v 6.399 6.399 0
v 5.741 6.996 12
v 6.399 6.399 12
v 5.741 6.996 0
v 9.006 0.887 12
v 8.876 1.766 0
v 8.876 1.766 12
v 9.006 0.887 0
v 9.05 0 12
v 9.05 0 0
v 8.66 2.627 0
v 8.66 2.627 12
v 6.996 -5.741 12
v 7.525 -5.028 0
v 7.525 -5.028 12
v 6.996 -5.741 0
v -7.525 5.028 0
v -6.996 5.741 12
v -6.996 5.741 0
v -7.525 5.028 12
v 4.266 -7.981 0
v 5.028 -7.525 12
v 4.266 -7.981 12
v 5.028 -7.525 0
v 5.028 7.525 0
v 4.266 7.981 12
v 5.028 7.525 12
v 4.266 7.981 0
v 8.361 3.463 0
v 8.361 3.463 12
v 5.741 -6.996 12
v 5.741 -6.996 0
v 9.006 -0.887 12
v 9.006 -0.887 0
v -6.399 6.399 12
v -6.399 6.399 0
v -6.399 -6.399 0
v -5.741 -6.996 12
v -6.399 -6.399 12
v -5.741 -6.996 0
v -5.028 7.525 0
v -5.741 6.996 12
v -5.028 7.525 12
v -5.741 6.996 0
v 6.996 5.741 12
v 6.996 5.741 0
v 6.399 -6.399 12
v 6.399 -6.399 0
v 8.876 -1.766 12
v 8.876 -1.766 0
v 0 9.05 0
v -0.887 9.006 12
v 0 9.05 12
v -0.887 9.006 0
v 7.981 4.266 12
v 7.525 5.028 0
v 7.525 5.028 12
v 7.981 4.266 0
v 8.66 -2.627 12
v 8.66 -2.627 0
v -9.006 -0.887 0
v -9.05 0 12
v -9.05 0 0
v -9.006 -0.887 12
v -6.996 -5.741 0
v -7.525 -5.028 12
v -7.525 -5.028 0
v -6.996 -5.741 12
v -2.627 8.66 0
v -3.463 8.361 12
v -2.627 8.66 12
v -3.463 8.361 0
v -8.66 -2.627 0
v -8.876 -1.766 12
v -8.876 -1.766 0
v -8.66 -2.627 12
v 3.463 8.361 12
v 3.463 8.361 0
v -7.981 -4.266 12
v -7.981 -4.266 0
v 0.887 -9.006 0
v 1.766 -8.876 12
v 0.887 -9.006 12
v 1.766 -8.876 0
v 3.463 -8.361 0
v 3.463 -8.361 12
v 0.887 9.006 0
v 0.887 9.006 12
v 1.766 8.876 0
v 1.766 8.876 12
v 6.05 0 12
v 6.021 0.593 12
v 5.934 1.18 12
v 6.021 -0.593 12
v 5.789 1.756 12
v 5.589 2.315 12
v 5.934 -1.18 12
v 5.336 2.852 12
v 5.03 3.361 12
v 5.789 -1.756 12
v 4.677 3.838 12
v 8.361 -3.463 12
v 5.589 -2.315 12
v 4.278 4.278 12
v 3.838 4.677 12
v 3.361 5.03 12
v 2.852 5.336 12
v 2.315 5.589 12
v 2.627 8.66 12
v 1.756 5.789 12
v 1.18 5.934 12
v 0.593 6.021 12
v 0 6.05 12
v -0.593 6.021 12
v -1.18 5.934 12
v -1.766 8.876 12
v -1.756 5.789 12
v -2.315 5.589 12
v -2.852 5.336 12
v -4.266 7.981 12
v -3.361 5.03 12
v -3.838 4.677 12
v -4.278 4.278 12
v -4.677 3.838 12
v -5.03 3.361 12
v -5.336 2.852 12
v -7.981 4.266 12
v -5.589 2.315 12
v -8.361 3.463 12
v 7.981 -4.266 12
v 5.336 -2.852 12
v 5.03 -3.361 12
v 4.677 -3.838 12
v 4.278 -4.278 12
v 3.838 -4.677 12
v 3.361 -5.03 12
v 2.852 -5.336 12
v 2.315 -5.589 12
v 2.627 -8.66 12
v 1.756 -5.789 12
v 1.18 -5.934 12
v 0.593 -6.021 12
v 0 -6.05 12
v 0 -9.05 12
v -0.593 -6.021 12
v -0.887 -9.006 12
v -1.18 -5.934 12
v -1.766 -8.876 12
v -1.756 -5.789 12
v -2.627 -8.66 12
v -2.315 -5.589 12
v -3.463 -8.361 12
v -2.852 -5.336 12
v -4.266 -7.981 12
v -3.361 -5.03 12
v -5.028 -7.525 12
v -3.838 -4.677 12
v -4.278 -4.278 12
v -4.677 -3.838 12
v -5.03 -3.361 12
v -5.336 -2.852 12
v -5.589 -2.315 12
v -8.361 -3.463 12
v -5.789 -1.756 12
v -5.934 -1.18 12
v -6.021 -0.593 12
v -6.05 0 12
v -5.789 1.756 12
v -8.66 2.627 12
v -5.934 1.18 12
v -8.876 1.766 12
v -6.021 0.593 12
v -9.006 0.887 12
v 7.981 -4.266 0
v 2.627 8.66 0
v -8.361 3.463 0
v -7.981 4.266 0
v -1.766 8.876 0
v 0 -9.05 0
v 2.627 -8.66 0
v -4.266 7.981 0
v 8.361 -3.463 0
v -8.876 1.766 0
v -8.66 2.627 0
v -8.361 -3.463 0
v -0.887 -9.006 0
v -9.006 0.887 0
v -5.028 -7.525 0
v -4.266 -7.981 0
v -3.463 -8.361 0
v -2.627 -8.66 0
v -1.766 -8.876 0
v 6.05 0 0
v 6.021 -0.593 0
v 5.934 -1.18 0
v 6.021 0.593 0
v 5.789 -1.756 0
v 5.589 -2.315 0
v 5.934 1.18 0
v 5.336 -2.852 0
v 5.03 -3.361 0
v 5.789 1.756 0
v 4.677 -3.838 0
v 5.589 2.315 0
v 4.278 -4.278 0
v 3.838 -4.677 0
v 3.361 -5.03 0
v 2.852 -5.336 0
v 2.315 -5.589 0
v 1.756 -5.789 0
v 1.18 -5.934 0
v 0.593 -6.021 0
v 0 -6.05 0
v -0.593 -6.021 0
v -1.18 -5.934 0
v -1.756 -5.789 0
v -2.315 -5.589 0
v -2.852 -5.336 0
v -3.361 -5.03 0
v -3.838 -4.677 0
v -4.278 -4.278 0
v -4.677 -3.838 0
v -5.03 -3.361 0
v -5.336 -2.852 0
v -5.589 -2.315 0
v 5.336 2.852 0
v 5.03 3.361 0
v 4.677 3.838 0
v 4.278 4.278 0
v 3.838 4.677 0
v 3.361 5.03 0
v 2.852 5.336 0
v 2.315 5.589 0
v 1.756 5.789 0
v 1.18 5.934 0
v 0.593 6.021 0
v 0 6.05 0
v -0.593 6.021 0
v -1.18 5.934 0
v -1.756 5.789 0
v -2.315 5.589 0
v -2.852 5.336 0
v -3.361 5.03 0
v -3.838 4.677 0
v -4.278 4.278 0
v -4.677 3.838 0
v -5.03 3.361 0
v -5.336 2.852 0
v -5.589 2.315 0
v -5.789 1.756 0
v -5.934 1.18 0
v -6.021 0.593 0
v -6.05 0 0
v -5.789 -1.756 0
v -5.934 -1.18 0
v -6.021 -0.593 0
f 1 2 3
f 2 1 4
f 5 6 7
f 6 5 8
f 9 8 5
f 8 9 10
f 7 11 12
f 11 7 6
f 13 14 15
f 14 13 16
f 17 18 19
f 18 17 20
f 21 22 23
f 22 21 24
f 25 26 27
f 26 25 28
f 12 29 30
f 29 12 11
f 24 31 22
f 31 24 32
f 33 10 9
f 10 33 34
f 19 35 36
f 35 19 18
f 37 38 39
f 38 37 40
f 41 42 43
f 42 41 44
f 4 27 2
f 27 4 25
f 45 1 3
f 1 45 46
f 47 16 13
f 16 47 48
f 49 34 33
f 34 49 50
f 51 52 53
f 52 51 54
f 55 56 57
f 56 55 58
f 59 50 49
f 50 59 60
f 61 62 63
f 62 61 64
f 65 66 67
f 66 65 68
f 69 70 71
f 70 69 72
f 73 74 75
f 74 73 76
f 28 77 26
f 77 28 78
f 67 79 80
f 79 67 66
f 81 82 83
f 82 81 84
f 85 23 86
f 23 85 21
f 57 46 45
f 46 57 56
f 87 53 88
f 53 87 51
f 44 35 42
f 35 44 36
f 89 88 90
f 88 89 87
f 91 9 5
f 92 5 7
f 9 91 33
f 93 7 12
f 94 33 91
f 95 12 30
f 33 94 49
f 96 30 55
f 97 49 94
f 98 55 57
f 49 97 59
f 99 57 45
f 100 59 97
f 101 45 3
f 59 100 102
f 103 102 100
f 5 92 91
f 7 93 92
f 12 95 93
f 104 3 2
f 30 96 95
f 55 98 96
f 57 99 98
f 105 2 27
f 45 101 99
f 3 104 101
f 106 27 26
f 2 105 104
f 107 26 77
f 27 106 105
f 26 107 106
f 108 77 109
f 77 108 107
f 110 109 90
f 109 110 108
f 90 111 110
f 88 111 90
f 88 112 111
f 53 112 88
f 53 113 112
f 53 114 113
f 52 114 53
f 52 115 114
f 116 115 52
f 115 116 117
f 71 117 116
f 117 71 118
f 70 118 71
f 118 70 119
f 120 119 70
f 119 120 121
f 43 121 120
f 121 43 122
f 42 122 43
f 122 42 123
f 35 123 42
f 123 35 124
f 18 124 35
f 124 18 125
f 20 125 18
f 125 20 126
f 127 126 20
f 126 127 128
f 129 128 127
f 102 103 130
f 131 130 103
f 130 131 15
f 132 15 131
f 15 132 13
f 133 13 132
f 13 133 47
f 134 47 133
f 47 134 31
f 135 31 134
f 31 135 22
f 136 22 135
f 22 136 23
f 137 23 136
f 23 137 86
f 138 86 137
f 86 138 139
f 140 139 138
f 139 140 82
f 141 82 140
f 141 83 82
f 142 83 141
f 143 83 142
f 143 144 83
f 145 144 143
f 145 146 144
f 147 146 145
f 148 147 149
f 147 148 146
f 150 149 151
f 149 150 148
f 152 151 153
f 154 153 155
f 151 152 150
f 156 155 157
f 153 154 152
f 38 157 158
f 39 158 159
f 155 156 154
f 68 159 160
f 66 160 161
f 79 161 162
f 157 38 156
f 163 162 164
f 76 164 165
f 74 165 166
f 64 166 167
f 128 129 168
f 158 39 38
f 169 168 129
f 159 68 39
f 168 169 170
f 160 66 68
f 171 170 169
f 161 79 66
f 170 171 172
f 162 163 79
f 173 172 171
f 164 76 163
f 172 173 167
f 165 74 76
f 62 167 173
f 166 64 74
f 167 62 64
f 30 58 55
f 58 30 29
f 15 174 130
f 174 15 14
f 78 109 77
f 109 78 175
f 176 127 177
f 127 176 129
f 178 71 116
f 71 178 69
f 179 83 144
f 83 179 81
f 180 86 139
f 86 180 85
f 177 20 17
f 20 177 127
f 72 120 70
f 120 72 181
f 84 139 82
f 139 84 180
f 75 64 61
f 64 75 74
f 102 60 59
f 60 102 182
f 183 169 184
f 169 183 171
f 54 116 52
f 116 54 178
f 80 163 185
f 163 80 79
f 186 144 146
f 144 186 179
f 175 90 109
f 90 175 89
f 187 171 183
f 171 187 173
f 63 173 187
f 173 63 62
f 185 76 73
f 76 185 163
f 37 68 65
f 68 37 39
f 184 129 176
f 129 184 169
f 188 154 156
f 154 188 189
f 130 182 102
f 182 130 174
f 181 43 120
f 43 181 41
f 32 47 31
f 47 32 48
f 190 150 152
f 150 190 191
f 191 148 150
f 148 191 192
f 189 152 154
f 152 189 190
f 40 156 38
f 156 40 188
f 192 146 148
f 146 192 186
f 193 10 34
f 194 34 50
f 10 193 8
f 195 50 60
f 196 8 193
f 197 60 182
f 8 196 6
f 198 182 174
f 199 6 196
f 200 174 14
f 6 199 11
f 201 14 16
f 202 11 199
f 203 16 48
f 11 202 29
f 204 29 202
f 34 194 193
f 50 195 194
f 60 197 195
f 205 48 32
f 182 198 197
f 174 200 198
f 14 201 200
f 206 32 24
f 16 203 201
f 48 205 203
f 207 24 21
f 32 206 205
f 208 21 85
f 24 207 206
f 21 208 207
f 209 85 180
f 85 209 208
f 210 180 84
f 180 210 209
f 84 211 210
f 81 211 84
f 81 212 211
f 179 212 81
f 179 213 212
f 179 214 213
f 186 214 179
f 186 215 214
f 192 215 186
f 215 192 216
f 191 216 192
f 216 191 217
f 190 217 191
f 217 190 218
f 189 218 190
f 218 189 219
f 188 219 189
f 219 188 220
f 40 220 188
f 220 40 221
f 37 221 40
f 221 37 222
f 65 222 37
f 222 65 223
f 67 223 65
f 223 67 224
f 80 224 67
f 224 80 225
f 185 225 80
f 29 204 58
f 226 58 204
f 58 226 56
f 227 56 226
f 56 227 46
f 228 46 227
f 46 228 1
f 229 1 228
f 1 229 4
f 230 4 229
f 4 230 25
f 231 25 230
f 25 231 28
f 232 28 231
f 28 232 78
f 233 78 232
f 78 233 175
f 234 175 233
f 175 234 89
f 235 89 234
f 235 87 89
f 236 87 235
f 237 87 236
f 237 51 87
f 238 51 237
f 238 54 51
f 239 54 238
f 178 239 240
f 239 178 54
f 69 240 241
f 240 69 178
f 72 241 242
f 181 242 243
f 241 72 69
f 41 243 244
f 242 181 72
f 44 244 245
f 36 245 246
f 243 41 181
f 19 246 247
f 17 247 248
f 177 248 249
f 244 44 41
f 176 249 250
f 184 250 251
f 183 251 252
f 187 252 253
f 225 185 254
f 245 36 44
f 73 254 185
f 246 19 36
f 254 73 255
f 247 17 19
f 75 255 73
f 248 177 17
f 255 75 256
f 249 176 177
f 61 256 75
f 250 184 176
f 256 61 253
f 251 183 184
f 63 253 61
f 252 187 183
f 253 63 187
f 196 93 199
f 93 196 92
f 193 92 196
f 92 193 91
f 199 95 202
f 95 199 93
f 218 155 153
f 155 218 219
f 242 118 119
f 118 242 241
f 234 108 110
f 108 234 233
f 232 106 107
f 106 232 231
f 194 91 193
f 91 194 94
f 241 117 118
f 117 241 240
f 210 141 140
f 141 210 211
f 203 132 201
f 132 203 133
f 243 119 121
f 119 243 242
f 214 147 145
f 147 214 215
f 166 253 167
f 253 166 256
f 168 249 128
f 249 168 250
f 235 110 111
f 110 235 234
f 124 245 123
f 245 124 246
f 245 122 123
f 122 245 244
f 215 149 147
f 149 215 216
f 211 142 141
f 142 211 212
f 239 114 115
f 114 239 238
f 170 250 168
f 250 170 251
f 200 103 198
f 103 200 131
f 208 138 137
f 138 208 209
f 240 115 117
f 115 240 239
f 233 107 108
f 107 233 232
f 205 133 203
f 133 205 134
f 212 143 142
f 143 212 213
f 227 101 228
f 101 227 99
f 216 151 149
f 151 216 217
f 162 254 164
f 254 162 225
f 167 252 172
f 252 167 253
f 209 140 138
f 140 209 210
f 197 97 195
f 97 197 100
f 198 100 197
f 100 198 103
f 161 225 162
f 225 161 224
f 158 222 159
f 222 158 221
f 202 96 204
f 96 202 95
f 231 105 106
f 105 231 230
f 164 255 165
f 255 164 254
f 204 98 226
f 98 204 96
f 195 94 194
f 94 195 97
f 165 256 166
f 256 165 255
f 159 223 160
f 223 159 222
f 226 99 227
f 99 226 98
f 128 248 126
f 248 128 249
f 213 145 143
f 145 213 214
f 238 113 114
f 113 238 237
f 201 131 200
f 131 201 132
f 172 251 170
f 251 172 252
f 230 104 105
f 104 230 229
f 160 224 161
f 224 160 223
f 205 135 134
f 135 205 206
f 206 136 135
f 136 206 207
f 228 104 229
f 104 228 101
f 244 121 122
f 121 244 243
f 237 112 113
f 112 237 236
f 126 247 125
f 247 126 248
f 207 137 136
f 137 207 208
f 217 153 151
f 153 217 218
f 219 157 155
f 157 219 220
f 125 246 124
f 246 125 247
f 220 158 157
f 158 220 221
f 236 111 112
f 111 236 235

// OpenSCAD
// 3D-Printed Siphon Strainer -- split-collet tubing clamp
// Source geometry as provided (verbatim), rendered for review.

$fn = 64;

// Tubing
tube_od = 6.35;
clearance = 0.25;

// Collet
clamp_length = 18;
wall = 3;
slot_width = 1.2;
num_slots = 4;
taper = 1.5;

// Collar
collar_length = 12;
collar_clearance = 0.2;

// Derived
bore = tube_od + clearance;
clamp_od = bore + 2*wall;
collar_id = clamp_od - 0.5;

module collet() {
    difference() {
        cylinder(
            h=clamp_length,
            d1=clamp_od+taper,
            d2=clamp_od
        );

        translate([0,0,-0.1])
            cylinder(
                h=clamp_length+0.2,
                d=bore
            );

        for (a=[0:360/num_slots:359]) {
            rotate([0,0,a])
                translate([0,-slot_width/2,-0.1])
                    cube([
                        clamp_od+taper,
                        slot_width,
                        clamp_length+0.2
                    ]);
        }
    }
}

module collar() {
    difference() {
        cylinder(
            h=collar_length,
            d=collar_id+2*wall
        );

        translate([0,0,-0.1])
            cylinder(
                h=collar_length+0.2,
                d=collar_id
            );
    }
}

// Print collar (uncommented for separate render)
// collet();

// Uncomment to print collar separately
collar();
